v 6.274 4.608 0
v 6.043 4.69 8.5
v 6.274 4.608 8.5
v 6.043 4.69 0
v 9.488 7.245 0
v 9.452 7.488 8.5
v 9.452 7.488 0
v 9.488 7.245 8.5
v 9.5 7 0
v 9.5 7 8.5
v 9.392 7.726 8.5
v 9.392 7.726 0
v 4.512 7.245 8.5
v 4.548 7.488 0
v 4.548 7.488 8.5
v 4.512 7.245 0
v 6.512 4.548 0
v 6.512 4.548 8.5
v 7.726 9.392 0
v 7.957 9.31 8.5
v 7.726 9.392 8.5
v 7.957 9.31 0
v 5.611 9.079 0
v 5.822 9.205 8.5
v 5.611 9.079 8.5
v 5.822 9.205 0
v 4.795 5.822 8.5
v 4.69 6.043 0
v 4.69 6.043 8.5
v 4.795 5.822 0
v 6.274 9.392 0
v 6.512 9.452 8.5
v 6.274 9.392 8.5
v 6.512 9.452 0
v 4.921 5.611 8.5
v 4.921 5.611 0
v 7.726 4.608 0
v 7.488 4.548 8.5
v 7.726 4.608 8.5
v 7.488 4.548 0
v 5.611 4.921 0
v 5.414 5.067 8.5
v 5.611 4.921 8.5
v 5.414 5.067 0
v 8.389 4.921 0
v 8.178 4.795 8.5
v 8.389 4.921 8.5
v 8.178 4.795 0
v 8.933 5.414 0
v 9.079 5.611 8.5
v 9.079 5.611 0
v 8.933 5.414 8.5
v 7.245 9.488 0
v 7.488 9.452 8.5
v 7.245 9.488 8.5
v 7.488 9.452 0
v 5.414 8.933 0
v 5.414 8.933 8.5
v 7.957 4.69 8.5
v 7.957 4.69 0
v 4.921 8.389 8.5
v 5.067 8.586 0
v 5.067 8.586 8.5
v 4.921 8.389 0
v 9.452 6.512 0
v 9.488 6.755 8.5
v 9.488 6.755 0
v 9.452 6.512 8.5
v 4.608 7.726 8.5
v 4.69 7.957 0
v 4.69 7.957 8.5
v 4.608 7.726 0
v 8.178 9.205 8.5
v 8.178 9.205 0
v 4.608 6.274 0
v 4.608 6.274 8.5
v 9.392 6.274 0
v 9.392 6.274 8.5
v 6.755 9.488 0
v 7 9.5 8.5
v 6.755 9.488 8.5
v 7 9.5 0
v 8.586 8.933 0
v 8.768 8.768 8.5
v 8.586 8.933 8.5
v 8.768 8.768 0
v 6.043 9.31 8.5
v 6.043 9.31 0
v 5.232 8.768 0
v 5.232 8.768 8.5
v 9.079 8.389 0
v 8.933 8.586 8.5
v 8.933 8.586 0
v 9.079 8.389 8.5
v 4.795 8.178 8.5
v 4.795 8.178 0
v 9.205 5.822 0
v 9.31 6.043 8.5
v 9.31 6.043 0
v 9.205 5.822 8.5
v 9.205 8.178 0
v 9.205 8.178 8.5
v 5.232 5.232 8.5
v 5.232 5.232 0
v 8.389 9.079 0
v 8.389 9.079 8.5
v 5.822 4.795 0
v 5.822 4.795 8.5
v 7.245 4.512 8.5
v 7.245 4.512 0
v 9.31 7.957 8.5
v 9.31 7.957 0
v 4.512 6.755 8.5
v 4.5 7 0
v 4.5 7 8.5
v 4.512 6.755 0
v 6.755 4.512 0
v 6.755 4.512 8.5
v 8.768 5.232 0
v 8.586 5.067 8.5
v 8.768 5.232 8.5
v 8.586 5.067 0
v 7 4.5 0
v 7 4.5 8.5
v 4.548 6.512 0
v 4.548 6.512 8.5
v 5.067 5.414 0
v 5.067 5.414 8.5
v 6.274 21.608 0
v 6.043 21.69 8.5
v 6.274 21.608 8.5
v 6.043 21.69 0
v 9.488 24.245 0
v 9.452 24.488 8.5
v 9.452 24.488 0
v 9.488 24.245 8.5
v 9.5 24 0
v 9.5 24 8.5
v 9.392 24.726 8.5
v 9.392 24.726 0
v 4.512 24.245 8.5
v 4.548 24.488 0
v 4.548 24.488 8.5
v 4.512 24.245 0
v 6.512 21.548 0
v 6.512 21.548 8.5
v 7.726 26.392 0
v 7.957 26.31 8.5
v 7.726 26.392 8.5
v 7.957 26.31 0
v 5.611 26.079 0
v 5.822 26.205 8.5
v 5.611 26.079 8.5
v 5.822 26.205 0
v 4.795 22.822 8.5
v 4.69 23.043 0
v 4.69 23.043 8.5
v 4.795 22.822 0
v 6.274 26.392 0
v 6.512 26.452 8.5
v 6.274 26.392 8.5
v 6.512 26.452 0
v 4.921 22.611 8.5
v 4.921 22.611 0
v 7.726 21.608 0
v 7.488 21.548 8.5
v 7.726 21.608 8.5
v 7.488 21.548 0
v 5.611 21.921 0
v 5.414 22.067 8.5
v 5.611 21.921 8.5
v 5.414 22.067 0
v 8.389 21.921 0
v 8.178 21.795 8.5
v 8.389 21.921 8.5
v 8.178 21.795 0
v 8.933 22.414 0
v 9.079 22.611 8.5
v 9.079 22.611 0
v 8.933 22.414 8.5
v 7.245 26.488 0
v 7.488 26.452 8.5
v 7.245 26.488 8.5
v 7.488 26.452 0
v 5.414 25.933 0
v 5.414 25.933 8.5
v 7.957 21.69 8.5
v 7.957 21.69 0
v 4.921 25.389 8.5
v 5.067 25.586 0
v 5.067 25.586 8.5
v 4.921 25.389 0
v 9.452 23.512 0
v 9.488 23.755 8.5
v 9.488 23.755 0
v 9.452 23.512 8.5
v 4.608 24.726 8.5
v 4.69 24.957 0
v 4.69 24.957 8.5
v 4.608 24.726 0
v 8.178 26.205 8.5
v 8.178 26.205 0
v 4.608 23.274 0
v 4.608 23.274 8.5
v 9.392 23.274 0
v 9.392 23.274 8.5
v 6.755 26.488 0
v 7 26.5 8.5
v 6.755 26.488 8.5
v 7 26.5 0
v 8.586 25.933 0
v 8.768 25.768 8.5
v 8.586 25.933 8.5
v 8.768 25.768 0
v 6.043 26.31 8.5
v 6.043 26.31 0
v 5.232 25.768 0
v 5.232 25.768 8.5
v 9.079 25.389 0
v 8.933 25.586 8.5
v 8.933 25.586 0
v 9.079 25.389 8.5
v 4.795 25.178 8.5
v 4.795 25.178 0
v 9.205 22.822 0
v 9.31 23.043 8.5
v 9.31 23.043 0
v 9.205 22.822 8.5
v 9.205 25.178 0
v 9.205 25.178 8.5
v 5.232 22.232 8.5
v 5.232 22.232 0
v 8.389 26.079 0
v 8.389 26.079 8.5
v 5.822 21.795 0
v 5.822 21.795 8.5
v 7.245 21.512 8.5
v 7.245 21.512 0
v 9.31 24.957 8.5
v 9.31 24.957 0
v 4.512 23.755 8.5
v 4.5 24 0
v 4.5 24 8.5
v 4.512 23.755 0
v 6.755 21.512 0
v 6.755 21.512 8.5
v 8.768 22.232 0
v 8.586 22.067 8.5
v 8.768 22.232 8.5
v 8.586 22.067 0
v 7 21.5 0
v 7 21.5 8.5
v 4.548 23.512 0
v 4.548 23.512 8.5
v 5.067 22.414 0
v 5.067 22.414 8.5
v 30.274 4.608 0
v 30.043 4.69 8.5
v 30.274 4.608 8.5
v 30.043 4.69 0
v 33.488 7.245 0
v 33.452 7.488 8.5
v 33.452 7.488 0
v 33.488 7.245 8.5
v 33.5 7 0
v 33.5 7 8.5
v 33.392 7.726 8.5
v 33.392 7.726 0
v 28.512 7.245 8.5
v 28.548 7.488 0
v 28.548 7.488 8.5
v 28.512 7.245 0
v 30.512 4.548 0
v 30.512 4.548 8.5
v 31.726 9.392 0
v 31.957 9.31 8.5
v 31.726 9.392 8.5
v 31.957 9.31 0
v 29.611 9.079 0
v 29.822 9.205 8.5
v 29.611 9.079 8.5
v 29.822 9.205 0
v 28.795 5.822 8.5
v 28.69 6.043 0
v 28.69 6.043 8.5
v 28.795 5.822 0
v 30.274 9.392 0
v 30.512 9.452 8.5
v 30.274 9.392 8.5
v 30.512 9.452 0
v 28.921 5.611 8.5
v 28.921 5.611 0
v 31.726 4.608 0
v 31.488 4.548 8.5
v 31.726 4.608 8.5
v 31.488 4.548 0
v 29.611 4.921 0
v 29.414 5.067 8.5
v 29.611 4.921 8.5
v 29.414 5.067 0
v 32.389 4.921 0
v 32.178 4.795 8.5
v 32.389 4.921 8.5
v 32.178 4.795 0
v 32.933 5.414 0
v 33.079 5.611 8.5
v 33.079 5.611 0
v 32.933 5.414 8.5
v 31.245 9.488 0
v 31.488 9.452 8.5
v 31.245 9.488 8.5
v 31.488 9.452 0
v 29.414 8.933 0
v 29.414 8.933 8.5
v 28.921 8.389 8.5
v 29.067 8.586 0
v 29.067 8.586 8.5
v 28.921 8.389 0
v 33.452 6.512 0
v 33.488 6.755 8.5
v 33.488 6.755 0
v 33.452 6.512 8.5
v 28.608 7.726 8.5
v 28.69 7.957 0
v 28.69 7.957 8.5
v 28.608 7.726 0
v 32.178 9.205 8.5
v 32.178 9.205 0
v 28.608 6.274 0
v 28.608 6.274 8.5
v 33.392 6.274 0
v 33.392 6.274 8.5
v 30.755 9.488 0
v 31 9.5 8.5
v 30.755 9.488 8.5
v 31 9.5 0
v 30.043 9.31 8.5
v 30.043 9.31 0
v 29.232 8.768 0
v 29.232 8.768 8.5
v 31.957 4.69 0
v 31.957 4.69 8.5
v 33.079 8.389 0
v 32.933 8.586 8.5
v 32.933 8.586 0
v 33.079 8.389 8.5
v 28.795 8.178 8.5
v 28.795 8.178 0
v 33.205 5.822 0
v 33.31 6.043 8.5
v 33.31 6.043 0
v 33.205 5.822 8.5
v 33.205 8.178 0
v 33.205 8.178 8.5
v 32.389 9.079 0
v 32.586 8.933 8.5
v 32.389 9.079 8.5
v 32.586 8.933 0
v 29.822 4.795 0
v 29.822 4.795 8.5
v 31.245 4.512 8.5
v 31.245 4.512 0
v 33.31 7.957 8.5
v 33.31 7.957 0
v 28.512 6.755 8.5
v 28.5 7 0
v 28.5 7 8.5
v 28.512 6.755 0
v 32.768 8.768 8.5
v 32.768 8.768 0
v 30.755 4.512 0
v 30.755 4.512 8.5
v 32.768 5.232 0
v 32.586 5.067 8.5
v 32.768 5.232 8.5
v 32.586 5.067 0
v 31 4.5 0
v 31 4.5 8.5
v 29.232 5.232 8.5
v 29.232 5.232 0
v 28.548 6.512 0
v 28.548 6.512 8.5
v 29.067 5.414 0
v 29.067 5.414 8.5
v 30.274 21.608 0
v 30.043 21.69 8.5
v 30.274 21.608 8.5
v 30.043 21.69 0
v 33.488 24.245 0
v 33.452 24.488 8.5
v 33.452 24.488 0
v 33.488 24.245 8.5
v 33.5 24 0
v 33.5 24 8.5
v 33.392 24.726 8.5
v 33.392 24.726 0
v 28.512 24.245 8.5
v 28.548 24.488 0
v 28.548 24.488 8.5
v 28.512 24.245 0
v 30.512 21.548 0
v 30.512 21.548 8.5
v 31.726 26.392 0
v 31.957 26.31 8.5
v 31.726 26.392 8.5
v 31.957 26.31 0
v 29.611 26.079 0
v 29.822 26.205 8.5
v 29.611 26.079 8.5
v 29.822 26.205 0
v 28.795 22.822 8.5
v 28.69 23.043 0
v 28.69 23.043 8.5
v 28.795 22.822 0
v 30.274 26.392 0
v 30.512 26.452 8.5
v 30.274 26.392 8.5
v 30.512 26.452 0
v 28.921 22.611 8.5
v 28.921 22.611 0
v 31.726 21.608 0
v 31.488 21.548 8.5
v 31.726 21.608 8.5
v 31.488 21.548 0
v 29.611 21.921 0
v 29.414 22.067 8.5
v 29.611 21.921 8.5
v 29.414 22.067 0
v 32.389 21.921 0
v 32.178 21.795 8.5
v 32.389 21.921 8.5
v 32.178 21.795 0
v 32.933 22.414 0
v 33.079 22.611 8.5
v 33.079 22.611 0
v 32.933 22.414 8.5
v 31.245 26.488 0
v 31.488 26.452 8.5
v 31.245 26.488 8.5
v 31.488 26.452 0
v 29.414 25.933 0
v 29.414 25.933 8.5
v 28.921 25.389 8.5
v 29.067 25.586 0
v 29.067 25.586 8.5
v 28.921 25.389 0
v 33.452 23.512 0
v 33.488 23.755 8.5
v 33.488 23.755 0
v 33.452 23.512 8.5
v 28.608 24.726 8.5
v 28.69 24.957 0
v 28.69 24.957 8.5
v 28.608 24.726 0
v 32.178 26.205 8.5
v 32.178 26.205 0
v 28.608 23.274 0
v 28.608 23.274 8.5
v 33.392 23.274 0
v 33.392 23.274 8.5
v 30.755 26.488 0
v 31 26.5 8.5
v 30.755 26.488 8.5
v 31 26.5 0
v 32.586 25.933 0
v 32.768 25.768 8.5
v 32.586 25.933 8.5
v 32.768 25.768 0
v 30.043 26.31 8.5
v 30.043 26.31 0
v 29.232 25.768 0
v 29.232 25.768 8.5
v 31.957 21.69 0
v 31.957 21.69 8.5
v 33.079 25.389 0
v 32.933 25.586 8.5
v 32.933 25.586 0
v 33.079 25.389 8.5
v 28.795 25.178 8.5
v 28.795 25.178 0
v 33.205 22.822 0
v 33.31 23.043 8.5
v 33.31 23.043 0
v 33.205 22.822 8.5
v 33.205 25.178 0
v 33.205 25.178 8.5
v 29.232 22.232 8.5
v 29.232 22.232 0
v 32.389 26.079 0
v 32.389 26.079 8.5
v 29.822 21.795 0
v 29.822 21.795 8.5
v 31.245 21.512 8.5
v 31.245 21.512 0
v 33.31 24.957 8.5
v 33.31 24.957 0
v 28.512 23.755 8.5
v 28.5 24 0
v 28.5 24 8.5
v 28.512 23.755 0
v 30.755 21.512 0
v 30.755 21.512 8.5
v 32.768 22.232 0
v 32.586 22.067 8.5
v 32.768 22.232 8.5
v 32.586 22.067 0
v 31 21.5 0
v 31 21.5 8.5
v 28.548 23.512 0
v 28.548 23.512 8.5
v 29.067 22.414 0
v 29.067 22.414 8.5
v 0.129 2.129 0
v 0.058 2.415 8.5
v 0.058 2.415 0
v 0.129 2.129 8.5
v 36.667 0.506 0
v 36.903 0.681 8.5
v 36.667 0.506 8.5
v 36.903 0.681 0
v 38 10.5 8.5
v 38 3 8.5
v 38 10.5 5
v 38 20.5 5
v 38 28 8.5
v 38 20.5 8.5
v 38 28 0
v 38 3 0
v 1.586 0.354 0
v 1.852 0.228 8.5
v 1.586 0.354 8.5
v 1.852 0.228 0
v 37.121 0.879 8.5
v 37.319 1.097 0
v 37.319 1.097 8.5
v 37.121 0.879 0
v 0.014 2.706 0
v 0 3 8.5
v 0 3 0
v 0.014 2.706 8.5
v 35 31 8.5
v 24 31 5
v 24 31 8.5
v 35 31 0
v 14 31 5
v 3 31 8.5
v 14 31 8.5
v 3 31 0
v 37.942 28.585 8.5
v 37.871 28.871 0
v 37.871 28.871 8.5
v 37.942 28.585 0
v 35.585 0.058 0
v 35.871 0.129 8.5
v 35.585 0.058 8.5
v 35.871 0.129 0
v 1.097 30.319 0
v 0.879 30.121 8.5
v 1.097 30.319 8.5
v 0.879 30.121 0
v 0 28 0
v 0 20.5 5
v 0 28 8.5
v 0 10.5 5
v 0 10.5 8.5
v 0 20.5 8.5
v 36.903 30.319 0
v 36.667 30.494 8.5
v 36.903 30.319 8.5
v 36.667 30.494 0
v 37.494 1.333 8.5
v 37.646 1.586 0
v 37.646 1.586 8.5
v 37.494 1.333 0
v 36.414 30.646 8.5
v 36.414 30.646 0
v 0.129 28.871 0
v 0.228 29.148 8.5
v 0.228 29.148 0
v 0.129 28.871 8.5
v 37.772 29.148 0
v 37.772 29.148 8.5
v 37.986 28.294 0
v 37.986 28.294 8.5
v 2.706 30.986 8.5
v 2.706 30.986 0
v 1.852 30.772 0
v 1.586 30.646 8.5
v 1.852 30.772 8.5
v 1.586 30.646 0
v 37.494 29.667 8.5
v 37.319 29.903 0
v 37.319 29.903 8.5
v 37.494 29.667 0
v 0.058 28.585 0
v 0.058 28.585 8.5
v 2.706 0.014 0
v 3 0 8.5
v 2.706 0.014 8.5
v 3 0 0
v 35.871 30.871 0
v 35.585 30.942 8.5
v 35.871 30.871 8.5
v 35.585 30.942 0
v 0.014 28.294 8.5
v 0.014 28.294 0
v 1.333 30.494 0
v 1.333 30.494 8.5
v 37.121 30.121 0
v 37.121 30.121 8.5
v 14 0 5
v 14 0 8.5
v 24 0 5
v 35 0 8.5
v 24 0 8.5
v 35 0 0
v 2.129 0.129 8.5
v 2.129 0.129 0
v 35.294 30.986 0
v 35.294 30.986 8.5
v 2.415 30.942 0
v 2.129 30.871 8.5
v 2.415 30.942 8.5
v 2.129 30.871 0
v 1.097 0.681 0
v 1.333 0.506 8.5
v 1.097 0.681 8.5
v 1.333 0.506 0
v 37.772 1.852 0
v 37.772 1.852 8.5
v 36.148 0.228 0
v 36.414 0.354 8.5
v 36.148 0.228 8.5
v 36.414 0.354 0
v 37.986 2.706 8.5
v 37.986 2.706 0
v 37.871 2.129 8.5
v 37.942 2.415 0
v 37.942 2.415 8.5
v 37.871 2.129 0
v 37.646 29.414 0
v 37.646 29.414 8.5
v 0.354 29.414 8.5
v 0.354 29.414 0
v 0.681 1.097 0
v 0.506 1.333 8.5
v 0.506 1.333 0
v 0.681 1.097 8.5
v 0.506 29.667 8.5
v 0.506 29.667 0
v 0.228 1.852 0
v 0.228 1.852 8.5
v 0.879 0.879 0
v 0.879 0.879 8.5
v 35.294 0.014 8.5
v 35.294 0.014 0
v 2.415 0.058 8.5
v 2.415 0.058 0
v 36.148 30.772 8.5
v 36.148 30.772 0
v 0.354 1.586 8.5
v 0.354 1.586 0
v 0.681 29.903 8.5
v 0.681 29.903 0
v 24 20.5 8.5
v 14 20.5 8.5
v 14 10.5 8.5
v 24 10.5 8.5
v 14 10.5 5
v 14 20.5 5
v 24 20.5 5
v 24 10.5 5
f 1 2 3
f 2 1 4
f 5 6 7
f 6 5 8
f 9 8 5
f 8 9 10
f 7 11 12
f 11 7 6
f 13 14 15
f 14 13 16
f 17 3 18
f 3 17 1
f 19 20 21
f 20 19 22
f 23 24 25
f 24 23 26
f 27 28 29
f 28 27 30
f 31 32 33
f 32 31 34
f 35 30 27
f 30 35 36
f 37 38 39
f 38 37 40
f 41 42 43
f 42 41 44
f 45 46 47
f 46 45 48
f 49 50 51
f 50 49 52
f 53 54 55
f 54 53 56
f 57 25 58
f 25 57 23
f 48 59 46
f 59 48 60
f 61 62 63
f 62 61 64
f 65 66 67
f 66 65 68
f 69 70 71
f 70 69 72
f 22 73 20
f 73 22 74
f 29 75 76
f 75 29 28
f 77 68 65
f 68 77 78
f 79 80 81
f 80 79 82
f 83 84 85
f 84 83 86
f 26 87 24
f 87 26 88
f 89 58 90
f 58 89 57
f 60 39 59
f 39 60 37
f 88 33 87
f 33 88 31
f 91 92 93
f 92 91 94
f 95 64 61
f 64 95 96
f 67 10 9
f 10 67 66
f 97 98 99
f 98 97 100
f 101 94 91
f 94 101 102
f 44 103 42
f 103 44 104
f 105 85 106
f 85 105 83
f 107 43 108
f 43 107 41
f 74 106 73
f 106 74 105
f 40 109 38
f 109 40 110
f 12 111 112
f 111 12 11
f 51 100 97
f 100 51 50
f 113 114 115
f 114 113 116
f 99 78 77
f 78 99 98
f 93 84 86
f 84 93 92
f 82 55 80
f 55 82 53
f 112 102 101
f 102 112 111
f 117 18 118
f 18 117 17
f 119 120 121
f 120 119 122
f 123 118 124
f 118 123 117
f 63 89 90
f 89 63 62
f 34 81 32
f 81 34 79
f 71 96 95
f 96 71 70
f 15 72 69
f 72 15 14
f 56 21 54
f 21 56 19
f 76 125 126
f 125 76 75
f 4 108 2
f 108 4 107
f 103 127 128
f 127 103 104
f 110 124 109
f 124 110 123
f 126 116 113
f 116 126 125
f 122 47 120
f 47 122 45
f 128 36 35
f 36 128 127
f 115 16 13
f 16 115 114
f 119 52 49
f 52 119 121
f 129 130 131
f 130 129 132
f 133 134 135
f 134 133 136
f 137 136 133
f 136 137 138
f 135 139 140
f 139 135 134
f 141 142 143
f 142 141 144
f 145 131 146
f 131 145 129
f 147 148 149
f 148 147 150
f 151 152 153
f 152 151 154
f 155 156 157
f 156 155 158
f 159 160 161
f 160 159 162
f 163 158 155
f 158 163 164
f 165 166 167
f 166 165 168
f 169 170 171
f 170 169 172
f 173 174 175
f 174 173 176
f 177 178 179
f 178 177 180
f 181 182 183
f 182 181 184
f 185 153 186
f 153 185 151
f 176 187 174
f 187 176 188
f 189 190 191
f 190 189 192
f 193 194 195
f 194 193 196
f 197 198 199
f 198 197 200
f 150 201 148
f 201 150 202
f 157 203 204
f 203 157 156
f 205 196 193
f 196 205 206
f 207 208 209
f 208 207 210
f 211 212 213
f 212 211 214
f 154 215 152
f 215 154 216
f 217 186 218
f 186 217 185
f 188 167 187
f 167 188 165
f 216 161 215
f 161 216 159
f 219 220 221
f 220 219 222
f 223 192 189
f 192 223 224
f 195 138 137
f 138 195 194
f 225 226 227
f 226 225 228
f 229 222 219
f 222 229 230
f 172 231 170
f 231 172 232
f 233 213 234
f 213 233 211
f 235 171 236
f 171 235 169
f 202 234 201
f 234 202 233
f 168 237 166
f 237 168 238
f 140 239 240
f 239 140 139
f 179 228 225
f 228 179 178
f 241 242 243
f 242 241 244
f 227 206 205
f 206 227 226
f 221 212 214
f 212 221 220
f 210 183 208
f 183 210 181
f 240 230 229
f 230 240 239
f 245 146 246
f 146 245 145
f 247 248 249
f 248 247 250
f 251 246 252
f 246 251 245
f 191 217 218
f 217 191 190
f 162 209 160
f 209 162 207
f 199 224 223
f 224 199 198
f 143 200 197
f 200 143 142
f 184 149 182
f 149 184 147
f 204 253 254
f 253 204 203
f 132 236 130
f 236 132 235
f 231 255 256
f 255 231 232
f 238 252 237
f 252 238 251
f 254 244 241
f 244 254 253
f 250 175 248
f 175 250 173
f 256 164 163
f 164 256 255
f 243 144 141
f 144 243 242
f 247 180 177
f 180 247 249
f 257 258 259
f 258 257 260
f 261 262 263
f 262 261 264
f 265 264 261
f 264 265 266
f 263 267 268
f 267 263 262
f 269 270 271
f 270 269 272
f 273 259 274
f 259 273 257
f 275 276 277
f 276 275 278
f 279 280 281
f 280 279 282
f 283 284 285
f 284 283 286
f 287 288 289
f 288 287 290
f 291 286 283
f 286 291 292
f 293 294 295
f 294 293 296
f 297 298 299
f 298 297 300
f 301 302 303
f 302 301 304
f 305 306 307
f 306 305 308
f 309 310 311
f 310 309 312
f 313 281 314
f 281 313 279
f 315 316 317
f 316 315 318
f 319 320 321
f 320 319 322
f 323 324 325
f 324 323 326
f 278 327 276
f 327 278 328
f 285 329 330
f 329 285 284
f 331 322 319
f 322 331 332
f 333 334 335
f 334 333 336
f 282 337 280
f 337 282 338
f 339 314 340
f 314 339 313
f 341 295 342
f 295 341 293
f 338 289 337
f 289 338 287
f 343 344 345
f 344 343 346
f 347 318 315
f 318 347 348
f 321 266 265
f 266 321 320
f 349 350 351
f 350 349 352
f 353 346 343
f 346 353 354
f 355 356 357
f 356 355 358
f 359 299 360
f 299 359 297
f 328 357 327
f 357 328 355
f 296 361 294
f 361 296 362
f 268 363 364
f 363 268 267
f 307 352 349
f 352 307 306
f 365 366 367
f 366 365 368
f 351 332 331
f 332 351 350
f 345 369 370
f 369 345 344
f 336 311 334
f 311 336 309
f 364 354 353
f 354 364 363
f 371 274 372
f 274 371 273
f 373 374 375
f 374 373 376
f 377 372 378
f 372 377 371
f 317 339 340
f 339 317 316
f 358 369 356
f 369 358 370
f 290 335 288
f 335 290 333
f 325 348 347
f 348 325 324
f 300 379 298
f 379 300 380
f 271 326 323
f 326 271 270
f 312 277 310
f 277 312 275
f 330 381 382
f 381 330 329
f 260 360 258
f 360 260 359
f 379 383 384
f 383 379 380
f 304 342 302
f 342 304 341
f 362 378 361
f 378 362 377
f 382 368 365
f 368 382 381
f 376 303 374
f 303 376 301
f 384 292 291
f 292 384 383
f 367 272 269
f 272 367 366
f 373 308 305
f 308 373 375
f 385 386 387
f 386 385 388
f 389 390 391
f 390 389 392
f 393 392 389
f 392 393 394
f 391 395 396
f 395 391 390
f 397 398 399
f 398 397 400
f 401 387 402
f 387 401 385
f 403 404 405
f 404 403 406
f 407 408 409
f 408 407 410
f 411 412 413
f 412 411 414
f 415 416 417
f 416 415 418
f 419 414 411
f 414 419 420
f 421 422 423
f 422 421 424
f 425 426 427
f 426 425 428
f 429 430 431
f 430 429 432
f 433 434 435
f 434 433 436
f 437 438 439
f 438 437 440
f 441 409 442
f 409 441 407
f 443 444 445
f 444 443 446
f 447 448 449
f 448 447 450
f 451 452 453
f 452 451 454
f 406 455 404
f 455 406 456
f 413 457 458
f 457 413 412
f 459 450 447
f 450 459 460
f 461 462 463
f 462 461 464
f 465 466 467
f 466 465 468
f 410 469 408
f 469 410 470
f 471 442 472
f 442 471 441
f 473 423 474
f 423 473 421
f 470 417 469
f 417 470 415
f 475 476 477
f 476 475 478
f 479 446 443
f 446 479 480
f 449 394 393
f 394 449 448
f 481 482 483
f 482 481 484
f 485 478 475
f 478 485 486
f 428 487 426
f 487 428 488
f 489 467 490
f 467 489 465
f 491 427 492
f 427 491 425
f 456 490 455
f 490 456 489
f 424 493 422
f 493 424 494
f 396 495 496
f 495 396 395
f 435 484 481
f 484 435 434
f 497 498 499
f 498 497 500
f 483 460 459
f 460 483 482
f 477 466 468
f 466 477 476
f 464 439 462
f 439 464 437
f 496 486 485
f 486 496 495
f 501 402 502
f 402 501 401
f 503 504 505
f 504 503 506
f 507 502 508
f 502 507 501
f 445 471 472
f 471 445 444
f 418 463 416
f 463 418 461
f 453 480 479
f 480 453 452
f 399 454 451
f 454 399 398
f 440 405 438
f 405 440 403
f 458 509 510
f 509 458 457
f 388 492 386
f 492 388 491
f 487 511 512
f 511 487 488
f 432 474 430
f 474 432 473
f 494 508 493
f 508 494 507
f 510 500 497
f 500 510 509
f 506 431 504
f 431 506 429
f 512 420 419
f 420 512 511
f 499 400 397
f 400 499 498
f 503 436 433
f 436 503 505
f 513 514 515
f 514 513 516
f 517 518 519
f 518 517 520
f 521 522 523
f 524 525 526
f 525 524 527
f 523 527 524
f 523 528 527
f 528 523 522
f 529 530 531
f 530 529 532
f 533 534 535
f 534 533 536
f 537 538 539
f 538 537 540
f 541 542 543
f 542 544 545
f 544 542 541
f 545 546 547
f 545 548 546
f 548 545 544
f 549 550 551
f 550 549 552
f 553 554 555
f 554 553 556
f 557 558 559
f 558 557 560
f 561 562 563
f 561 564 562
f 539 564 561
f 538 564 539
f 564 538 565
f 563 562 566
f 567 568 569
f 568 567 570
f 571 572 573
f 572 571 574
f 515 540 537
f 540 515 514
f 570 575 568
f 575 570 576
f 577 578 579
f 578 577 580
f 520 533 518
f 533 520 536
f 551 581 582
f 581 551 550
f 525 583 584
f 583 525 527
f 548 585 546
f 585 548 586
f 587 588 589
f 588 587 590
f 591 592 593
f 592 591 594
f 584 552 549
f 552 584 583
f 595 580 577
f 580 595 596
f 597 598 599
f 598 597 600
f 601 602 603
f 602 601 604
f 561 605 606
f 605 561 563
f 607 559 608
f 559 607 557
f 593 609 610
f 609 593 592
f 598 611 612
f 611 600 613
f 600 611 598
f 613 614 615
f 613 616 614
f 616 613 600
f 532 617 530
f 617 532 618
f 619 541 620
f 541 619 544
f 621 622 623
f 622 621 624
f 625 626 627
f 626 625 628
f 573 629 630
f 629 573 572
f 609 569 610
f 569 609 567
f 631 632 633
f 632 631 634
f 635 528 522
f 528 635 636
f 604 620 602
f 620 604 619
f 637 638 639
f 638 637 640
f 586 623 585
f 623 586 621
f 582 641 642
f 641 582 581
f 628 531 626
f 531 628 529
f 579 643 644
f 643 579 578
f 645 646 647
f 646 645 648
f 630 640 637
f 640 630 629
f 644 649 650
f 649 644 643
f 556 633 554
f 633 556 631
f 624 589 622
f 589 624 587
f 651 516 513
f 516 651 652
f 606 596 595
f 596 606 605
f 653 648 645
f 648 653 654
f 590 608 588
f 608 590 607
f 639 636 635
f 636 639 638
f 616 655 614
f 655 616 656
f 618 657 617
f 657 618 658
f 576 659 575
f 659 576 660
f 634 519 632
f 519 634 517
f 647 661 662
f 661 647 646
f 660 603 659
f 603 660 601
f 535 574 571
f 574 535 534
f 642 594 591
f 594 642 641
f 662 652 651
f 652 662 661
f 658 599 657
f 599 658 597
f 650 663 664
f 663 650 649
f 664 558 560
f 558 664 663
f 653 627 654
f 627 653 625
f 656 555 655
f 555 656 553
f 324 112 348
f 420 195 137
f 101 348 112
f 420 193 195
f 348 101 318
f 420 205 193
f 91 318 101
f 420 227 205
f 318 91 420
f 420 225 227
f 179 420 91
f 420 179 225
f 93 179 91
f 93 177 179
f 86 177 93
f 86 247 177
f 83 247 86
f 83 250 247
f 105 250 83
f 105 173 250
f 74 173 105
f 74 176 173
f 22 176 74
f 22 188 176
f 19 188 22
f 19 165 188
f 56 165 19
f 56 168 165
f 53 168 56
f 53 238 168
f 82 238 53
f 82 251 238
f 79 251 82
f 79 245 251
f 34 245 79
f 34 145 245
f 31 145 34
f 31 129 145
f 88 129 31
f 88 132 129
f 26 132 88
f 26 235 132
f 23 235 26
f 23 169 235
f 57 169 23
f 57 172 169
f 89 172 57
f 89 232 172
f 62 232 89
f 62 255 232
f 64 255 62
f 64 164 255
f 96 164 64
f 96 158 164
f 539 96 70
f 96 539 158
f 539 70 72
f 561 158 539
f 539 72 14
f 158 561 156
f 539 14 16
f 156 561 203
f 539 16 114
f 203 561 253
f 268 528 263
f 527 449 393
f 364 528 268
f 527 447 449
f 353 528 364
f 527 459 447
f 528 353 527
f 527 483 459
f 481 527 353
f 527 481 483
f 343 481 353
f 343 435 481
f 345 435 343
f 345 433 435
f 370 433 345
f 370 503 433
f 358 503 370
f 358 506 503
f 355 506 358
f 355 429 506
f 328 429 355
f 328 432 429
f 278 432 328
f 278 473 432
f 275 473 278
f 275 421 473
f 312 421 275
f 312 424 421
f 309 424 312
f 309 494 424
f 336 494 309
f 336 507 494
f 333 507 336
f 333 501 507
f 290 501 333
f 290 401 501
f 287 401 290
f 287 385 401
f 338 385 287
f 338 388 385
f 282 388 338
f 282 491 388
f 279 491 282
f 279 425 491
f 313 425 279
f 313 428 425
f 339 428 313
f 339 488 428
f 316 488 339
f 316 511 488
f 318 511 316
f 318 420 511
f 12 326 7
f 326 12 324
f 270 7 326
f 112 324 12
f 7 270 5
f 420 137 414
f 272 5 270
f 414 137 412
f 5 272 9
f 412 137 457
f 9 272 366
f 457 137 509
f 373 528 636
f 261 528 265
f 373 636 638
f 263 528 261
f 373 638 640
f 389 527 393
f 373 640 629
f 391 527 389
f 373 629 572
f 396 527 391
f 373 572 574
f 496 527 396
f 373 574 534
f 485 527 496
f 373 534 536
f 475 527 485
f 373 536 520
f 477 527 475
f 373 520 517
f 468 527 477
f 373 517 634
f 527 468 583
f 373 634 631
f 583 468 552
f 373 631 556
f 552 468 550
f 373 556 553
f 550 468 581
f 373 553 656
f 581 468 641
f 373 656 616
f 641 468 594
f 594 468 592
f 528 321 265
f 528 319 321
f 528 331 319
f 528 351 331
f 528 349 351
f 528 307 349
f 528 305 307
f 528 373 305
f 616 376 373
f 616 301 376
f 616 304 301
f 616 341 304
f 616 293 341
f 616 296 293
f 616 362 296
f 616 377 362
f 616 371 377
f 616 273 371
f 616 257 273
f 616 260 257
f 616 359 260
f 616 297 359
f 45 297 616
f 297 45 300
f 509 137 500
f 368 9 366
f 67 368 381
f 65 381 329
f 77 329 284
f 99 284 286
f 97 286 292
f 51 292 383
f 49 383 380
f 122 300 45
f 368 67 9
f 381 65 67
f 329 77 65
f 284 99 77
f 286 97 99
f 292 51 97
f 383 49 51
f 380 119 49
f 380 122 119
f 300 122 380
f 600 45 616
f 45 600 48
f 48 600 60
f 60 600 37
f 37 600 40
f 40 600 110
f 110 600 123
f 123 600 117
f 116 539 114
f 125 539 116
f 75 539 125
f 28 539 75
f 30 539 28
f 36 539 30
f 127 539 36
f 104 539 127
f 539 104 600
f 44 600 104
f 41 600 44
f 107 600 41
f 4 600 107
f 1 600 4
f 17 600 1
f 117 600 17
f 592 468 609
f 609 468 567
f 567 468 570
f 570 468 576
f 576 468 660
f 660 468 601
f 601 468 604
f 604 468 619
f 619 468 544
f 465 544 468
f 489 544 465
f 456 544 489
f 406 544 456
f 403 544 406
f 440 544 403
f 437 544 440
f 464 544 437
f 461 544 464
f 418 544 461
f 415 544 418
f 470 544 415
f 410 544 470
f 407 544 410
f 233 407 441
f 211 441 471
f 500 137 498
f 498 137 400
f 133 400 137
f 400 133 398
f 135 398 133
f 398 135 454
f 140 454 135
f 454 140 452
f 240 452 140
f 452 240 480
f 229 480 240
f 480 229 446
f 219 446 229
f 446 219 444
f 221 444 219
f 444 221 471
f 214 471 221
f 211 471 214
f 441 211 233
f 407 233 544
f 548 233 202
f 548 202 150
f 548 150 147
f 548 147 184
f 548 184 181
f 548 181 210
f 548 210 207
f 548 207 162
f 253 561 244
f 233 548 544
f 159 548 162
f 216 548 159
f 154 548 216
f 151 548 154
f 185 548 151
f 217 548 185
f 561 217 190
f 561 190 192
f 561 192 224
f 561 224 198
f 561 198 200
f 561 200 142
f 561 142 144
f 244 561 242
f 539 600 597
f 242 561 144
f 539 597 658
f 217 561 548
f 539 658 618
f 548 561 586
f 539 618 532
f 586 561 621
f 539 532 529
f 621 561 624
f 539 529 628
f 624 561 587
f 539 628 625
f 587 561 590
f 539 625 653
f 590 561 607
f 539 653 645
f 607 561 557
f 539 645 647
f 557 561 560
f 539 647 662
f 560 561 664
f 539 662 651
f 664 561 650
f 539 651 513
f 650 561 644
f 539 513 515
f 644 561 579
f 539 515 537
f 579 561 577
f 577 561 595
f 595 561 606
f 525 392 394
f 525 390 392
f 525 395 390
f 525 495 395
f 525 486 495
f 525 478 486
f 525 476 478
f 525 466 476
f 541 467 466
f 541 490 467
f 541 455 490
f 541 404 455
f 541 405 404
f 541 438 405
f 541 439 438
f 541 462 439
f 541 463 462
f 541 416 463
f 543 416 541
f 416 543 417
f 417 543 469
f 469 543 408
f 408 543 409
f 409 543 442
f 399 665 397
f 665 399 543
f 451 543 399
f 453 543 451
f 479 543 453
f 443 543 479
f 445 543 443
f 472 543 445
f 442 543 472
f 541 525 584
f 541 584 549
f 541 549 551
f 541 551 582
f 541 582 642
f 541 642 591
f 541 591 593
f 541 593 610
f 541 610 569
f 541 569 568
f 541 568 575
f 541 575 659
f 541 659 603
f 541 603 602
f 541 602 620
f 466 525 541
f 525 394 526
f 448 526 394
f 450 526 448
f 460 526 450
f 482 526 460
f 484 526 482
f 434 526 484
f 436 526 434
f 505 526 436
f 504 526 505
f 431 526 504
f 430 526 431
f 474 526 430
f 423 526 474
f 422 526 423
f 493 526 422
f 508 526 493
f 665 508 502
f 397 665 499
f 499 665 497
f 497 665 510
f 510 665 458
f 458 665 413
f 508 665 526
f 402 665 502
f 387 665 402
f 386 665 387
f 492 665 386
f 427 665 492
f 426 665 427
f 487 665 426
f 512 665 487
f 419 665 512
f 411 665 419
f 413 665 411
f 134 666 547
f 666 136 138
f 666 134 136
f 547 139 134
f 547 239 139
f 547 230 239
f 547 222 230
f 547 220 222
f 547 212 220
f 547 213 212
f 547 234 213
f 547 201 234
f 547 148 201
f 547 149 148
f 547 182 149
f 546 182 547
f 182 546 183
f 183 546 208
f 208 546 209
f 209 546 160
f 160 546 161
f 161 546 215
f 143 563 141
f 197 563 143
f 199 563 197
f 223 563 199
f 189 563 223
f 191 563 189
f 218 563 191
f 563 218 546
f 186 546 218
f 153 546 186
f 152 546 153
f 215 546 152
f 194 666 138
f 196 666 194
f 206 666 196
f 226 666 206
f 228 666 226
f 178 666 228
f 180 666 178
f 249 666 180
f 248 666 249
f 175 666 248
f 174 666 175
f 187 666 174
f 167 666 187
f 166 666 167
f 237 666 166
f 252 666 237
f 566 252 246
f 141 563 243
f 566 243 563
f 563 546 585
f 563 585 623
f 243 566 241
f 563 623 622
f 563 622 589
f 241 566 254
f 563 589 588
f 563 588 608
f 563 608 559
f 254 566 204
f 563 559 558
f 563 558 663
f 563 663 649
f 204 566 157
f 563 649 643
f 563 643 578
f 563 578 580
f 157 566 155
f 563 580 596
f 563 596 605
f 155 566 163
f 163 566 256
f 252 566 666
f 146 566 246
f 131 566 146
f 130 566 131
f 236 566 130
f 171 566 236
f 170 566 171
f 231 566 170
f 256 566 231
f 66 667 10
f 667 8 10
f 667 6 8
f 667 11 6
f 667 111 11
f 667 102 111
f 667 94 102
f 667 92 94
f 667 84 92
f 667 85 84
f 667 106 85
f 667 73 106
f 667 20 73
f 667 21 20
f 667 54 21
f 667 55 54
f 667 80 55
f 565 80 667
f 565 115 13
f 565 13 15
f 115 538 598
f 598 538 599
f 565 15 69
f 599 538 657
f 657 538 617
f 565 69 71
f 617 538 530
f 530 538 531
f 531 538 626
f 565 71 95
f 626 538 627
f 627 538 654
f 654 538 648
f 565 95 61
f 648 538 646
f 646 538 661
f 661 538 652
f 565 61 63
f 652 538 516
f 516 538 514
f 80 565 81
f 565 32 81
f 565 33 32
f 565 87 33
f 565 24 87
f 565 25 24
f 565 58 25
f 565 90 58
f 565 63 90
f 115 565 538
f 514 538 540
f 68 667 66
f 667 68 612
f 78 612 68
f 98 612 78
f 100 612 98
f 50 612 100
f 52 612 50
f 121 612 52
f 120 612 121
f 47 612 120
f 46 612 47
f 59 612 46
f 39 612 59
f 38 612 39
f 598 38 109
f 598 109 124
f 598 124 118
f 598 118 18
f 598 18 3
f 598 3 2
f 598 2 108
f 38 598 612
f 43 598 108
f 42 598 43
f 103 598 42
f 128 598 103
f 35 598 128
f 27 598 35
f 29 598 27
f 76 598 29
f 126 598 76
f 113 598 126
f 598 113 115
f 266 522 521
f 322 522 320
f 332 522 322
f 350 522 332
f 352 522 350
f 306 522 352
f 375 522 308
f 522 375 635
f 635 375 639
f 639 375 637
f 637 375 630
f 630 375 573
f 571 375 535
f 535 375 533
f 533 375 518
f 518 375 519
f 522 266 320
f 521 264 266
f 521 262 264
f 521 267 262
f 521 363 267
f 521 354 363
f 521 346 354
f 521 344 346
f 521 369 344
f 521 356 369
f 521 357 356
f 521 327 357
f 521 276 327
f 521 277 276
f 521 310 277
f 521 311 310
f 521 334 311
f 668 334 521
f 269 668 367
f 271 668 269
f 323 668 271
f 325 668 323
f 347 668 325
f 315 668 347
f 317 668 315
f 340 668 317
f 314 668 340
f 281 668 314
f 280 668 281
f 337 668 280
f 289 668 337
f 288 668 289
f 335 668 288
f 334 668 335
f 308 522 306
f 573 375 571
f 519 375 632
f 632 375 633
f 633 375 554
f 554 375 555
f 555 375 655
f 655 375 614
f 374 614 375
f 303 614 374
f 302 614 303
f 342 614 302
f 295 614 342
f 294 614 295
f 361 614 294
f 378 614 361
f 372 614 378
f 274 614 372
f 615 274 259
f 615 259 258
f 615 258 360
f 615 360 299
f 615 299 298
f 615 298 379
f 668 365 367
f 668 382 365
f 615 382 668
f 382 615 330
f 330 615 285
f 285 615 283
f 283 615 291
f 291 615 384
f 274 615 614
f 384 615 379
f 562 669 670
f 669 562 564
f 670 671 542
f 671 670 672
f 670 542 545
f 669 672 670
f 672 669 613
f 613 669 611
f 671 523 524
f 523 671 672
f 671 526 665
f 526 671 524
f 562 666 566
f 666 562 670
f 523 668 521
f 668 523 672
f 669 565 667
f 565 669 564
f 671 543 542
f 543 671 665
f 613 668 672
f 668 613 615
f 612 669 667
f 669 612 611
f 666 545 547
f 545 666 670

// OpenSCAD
// Extrusion bracket overall size (X,Y,Z) = [38, 31, 8.5]
length = 38;
width  = 31;
thickness = 8.5;

// Bracket style parameters (kept within overall envelope)
corner_r = 3;          // rounded outer corners
hole_d = 5;            // through holes
hole_edge = 7;         // hole center distance from each outer edge
relief_w = 10;         // clearance relief width
relief_d = 3.5;        // clearance relief depth (into thickness)
$fn = 64;

module rounded_plate_xy(L, W, H, R) {
    // 2D rounded rectangle extruded to thickness
    linear_extrude(height=H)
        hull() {
            translate([R,     R])     circle(r=R);
            translate([L - R, R])     circle(r=R);
            translate([R,     W - R]) circle(r=R);
            translate([L - R, W - R]) circle(r=R);
        }
}

module extrusion_bracket() {
    eps = 0.02;

    difference() {
        // Main connected solid (single body)
        rounded_plate_xy(length, width, thickness, corner_r);

        // 4 mounting holes (typical corner bracket pattern)
        for (x = [hole_edge, length - hole_edge])
            for (y = [hole_edge, width - hole_edge])
                translate([x, y, thickness/2])
                    cylinder(h=thickness + 2*eps, d=hole_d, center=true);

        // Clearance reliefs on underside (do not cut through)
        // Long relief along X, centered in Y
        translate([0, (width - relief_w)/2, thickness - relief_d])
            cube([length, relief_w, relief_d + eps], center=false);

        // Long relief along Y, centered in X
        translate([(length - relief_w)/2, 0, thickness - relief_d])
            cube([relief_w, width, relief_d + eps], center=false);
    }
}

extrusion_bracket();
